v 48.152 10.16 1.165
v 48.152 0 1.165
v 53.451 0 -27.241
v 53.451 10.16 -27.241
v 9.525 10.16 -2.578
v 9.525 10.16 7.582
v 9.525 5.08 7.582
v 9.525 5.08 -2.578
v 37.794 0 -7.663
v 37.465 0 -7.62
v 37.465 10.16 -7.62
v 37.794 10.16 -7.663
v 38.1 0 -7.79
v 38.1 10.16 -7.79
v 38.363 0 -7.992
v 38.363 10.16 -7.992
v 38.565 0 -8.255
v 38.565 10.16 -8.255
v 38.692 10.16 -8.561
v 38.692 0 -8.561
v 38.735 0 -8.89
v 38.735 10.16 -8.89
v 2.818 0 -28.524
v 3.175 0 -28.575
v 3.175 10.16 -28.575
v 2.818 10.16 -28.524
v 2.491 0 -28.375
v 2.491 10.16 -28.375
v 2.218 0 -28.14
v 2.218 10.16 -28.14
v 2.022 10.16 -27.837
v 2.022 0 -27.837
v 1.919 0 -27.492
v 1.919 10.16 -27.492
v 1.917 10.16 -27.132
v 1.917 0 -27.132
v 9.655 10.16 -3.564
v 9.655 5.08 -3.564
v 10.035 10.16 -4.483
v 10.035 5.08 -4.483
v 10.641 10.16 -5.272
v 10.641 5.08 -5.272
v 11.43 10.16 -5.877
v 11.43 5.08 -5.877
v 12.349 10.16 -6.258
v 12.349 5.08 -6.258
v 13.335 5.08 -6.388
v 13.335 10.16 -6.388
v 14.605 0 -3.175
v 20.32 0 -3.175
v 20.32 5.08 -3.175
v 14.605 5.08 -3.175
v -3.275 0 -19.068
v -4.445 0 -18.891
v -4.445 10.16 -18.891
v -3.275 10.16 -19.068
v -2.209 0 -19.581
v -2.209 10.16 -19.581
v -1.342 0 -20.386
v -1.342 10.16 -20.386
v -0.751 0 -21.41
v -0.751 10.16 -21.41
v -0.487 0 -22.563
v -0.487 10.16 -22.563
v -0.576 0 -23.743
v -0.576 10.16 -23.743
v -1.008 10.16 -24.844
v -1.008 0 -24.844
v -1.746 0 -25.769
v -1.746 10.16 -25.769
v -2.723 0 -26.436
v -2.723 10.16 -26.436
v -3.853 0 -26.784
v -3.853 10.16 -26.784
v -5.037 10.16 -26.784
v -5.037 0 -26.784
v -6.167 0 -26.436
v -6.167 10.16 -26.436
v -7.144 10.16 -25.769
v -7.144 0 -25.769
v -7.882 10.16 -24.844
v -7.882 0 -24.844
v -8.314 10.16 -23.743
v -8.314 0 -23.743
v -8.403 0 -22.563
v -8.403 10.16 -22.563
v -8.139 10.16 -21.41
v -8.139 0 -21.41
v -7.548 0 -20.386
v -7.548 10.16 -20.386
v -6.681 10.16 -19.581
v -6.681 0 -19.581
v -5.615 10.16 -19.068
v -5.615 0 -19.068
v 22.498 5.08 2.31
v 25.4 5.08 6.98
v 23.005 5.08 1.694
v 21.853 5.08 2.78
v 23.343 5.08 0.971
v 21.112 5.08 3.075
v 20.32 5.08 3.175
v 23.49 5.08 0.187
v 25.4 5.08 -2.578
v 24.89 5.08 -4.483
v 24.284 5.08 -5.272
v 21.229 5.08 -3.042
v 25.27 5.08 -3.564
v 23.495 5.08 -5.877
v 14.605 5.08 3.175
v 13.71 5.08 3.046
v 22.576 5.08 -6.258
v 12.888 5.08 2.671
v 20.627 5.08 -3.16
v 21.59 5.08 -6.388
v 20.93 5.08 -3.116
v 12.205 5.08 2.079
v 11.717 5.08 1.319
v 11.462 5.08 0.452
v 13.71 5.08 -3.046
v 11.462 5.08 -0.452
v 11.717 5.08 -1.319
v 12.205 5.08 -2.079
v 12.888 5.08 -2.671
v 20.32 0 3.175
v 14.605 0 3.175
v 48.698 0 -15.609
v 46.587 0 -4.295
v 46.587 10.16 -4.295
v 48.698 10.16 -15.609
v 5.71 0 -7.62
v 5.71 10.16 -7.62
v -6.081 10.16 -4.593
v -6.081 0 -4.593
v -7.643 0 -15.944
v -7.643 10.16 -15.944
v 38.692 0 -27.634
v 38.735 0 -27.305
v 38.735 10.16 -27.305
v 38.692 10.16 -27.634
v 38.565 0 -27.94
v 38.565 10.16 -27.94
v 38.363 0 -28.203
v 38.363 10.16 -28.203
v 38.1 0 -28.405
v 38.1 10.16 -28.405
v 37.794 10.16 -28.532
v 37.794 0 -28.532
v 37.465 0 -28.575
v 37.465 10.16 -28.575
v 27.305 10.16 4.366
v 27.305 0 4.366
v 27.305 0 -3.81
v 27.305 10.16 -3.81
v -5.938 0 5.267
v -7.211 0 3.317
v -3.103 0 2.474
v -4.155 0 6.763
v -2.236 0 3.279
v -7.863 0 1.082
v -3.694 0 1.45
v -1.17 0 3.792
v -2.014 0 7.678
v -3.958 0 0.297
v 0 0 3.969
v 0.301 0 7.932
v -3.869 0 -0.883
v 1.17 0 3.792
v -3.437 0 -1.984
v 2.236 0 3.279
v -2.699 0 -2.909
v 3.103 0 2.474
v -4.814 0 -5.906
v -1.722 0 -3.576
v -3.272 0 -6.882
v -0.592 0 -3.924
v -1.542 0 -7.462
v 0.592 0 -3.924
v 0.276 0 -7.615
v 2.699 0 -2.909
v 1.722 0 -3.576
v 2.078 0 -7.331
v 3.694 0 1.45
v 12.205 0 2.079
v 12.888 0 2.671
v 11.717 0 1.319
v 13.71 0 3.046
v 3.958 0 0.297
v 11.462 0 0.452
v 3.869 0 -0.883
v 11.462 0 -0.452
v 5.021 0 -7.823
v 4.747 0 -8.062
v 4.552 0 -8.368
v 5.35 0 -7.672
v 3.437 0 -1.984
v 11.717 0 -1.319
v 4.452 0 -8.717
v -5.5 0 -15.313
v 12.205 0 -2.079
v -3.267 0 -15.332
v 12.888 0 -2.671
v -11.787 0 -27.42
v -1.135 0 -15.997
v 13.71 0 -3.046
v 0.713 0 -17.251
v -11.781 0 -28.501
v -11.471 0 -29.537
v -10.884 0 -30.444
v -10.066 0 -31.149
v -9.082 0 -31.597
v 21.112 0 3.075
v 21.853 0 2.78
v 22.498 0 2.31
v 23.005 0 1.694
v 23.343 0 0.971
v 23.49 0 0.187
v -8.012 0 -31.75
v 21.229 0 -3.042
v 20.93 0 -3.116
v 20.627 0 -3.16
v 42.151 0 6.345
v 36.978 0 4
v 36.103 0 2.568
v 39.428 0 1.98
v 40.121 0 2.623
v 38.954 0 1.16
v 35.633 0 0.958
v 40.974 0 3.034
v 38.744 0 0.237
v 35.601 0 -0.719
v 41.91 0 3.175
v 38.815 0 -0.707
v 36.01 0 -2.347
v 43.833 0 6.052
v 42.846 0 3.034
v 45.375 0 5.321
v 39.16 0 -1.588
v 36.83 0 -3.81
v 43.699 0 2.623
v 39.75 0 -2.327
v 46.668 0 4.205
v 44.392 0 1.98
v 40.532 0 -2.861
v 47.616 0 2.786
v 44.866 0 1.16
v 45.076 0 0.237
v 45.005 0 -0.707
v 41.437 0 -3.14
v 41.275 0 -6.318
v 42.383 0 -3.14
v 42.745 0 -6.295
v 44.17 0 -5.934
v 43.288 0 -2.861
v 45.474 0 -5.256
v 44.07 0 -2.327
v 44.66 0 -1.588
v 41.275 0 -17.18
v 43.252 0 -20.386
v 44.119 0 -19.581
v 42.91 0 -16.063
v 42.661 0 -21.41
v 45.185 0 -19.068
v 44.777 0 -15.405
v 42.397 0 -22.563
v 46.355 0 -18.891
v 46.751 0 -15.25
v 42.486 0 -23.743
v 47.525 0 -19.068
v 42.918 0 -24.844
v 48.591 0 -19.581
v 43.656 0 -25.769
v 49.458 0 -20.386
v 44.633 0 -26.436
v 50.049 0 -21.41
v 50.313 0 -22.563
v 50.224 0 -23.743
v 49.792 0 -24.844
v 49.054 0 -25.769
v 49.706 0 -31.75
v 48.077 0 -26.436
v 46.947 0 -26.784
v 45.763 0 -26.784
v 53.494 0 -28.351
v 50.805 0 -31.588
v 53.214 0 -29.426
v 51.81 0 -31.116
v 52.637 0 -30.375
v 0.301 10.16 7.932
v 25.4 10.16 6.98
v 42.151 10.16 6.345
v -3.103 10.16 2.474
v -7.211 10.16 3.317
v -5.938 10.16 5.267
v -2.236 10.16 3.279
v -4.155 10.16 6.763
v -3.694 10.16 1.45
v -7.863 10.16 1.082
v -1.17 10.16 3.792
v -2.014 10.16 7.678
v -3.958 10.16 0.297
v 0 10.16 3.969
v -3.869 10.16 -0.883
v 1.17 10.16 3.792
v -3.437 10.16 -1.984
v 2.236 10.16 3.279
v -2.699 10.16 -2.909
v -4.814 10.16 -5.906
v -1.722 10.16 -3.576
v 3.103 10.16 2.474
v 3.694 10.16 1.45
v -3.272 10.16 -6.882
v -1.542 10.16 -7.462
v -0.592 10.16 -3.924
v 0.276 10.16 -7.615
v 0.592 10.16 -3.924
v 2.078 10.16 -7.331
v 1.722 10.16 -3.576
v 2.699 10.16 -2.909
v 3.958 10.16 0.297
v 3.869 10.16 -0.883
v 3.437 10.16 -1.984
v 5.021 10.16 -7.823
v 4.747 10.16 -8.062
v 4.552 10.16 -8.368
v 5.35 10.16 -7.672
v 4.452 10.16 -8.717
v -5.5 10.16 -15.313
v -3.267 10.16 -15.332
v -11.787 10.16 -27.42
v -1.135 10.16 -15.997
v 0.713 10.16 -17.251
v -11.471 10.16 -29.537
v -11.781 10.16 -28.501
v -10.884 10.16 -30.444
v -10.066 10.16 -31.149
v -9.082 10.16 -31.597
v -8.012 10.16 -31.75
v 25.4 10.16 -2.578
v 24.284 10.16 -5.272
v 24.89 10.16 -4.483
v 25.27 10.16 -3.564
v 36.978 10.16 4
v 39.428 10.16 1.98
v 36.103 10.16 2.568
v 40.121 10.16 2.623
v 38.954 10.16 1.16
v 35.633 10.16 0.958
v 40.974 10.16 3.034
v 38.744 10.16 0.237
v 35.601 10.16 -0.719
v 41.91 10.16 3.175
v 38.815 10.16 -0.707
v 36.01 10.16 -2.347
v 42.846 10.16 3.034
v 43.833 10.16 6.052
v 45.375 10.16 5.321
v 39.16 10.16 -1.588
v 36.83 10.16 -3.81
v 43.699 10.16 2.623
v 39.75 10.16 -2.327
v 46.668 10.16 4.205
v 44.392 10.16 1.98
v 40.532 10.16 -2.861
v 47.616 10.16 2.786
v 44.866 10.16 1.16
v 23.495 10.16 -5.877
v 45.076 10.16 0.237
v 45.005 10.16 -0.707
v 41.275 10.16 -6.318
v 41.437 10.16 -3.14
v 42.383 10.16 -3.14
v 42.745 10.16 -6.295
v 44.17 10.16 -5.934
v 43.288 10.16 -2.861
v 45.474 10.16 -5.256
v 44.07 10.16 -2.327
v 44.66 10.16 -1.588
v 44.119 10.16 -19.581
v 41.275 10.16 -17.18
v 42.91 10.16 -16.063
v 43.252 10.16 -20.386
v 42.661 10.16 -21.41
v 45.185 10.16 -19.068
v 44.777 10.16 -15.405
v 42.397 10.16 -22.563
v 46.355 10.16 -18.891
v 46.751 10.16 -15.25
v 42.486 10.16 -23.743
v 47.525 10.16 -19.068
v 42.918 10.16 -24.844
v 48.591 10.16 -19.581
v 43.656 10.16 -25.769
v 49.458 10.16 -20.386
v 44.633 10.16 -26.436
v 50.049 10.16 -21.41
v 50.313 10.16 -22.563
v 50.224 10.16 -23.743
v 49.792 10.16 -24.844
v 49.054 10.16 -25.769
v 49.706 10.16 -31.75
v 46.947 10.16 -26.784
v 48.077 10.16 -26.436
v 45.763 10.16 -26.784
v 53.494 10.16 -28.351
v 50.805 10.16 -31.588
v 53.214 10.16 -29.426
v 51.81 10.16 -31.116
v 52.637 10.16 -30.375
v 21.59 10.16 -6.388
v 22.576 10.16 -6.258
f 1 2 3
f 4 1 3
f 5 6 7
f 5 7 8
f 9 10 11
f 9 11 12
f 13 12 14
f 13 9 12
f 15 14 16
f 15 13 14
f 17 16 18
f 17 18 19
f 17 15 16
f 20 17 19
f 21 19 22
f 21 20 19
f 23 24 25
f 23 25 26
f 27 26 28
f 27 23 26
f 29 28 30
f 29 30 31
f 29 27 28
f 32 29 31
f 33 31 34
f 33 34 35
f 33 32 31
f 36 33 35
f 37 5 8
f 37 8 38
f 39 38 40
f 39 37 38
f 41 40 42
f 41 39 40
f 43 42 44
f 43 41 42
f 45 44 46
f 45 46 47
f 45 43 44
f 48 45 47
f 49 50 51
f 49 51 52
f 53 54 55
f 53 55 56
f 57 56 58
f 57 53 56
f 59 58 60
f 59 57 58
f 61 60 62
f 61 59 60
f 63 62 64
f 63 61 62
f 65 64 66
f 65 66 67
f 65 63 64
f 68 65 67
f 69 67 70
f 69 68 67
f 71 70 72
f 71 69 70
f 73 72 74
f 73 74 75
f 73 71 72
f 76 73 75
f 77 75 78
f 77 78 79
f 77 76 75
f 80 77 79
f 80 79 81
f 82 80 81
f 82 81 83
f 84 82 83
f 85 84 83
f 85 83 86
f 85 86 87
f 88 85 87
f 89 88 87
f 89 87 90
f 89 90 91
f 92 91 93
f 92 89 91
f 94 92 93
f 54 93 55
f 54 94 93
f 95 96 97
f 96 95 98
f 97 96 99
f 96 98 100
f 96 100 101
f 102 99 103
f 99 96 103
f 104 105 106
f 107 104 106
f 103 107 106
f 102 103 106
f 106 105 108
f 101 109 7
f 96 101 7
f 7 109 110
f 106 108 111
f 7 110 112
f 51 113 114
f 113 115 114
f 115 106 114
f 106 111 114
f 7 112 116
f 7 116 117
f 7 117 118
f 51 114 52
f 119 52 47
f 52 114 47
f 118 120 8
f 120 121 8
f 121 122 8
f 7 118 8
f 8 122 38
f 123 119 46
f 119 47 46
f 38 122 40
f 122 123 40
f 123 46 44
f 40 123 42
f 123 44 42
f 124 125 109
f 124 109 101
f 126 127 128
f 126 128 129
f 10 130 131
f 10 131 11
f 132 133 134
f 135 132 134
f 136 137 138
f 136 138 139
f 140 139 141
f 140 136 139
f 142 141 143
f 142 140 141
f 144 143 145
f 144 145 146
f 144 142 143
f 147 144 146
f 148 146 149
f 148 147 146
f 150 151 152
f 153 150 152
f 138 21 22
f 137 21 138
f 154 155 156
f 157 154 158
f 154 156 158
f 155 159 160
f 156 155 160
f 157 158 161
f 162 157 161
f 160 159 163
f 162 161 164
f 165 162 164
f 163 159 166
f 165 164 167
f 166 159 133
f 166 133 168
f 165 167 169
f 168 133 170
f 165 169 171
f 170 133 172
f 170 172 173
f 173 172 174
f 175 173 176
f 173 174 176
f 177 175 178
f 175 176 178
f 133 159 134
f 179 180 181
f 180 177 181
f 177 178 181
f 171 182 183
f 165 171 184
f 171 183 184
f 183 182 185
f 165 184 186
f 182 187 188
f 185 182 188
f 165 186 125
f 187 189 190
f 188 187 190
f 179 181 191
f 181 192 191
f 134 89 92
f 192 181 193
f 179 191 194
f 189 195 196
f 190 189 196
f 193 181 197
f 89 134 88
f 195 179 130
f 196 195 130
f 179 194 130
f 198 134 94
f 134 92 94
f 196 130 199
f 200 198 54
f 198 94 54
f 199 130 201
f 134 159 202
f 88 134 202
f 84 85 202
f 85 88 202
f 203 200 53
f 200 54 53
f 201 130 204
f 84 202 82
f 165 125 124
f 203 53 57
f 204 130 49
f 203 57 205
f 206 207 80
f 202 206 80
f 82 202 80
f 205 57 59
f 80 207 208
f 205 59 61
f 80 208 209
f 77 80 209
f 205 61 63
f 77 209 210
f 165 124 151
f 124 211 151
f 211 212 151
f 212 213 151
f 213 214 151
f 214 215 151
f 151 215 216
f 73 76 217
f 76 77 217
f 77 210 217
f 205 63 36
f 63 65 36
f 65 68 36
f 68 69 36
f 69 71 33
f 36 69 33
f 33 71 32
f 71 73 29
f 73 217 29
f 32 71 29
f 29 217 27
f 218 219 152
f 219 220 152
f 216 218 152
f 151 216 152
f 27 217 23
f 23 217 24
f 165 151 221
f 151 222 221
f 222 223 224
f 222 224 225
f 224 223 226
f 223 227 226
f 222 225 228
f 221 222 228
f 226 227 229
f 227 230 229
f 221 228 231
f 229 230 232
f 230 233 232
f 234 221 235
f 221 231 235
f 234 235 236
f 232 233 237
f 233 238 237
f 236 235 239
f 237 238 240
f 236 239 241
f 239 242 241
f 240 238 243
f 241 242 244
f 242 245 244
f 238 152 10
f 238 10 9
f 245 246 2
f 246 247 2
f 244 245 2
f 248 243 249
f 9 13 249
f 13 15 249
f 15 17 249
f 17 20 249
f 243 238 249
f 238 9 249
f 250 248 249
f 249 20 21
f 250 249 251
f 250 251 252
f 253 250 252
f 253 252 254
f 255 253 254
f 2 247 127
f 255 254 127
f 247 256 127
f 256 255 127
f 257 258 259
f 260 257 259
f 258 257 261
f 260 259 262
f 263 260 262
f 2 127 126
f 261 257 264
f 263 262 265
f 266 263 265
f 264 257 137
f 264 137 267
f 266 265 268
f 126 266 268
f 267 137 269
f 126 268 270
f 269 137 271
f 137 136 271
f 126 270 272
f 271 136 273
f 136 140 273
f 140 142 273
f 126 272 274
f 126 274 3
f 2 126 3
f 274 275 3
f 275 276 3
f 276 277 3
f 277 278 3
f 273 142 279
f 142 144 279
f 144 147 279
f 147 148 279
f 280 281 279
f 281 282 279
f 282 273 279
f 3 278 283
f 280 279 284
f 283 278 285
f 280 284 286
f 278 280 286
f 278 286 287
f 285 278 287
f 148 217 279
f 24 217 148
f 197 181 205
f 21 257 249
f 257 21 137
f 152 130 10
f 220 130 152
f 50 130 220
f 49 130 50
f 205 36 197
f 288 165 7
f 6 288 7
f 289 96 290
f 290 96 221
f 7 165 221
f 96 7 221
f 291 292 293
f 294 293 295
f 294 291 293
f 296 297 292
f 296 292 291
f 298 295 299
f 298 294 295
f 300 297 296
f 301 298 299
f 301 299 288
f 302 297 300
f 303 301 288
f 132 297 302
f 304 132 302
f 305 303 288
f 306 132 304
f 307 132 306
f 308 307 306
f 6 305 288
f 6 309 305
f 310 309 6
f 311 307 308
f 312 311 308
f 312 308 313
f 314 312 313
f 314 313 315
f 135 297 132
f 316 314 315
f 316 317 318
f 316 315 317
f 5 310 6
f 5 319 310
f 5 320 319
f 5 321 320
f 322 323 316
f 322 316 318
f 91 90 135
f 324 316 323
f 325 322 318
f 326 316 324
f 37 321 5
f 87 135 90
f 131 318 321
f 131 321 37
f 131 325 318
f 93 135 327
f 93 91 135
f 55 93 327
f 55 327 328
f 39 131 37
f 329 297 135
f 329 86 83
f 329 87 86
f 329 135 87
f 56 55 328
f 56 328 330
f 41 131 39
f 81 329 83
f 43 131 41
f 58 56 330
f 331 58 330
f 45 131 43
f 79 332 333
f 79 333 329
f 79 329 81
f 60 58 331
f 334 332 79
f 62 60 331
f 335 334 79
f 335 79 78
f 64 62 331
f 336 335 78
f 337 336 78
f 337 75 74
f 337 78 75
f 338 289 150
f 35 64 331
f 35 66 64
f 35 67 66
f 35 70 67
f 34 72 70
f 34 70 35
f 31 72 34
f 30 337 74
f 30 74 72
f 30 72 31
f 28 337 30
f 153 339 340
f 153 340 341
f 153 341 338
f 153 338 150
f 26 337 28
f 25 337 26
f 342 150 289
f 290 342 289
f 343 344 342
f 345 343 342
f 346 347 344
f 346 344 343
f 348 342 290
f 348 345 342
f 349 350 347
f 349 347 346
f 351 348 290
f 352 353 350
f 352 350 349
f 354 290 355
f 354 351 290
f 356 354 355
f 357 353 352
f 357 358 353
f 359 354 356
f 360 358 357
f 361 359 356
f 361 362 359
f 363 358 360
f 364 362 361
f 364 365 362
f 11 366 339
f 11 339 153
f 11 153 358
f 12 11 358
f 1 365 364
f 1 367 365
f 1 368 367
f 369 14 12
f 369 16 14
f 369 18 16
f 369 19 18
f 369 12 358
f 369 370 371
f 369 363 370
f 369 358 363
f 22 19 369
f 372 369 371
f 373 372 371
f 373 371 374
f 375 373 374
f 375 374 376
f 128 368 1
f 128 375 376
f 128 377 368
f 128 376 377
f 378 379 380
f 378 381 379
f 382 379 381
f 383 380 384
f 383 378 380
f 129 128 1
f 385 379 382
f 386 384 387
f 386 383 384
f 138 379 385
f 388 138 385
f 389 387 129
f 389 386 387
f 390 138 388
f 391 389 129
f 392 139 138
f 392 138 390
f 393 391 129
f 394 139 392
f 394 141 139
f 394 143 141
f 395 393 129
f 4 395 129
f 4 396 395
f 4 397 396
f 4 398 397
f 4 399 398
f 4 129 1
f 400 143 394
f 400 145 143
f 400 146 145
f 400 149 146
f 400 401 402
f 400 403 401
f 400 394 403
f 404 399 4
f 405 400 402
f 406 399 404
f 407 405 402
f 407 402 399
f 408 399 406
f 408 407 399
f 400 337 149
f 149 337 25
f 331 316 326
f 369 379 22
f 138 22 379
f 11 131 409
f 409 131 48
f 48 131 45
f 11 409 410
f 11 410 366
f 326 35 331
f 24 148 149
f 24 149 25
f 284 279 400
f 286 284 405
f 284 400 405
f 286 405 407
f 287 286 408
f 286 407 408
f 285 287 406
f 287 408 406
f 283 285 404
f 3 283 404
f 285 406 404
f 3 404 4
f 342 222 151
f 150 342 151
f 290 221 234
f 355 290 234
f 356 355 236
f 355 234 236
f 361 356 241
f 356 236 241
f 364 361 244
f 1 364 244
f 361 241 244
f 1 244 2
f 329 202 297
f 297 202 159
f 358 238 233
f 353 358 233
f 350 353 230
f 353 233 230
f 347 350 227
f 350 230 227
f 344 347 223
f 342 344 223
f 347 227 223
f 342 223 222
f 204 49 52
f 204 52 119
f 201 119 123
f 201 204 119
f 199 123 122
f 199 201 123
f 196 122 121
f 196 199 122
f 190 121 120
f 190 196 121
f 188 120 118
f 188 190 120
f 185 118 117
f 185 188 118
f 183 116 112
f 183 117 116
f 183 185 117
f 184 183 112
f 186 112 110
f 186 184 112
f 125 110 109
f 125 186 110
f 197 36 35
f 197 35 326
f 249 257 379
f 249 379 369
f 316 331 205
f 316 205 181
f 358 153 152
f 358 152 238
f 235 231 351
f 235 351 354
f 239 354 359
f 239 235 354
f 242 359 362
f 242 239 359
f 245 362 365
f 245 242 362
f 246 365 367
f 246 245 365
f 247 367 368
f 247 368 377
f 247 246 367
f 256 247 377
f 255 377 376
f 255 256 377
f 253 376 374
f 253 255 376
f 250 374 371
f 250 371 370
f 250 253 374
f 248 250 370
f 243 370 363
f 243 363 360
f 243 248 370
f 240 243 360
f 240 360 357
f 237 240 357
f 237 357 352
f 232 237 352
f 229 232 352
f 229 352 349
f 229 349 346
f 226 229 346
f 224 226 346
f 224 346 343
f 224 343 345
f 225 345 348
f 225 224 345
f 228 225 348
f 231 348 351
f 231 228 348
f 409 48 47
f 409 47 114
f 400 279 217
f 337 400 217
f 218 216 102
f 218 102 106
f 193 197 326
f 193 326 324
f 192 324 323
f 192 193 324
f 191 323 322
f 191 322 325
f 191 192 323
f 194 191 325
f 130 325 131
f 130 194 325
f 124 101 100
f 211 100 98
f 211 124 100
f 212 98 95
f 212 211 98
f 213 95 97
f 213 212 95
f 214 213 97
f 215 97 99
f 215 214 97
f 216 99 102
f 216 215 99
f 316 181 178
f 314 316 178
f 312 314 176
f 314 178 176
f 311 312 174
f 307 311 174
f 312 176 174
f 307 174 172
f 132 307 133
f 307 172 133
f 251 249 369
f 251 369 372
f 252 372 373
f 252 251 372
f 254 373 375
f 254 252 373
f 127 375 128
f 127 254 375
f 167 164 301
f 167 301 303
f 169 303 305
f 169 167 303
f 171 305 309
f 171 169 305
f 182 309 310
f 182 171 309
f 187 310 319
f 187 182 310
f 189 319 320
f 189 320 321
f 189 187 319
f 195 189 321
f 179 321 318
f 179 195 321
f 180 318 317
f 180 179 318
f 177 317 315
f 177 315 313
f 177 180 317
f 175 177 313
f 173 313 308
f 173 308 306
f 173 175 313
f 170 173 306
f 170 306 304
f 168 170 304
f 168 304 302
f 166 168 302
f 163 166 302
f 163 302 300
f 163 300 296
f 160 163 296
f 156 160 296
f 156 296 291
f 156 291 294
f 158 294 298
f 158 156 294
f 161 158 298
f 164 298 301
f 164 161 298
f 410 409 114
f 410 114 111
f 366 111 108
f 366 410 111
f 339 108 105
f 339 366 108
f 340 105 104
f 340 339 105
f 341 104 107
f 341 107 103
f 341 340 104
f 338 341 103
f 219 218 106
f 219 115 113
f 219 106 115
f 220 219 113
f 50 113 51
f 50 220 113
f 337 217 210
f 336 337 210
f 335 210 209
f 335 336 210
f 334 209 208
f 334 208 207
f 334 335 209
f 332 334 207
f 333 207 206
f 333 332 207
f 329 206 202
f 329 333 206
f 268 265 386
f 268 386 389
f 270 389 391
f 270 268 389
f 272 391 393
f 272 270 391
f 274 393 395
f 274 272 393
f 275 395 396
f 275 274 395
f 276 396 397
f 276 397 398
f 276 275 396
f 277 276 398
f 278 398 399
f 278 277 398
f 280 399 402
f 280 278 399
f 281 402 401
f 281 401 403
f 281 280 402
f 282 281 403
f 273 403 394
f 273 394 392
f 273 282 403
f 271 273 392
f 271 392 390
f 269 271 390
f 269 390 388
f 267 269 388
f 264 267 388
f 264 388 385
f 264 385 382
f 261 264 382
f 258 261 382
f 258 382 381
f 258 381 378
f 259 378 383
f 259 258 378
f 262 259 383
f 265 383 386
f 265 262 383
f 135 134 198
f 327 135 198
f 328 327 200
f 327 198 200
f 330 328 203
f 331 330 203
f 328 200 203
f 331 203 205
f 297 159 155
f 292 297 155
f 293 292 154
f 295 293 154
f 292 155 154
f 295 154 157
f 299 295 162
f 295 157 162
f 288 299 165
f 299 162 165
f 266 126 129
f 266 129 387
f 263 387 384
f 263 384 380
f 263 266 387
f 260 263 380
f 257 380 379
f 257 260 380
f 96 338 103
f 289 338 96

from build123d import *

# Parameters (mm, degrees)
SKETCH3_R           = 3.96875
SKETCH3_R_2         = 3.175
BOSS_EXTRUDE4_DEPTH = 10.16
CUT_EXTRUDE3_DEPTH  = 5.08
FILLET1_R           = 3.81


with BuildPart() as part:
    # Sketch3 → Boss-Extrude4 (new body)
    with BuildSketch(Plane(origin=(0, 0, 0), x_dir=(1, 0, 0), z_dir=(0, 1, 0))):
        with BuildLine():
            Line((54.2925, 31.75), (-12.3825, 31.75))
            Line((-12.3825, 31.75), (-7.863361559, -1.082336008))
            ThreePointArc((-7.863361559, -1.082336008), (-5.101706023, -6.080830692), (0.300662879, -7.931803583))
            Line((0.300662879, -7.931803583), (42.150530303, -6.345442867))
            ThreePointArc((42.150530303, -6.345442867), (46.059378881, -4.806782177), (48.152310263, -1.164501002))
            Line((48.152310263, -1.164501002), (54.2925, 31.75))
        make_face()
        Circle(SKETCH3_R, mode=Mode.SUBTRACT)
        with Locations((-4.445, 22.86)):
            Circle(SKETCH3_R, mode=Mode.SUBTRACT)
        with Locations((46.355, 22.86)):
            Circle(SKETCH3_R, mode=Mode.SUBTRACT)
        with Locations((41.91, 0)):
            Circle(SKETCH3_R_2, mode=Mode.SUBTRACT)
        with BuildLine():
            Line((38.735, 8.89), (38.735, 27.305))
            ThreePointArc((38.735, 27.305), (38.363025612, 28.203025612), (37.465, 28.575))
            Line((37.465, 28.575), (3.175, 28.575))
            ThreePointArc((3.175, 28.575), (2.217704153, 28.139556566), (1.91686215, 27.131826239))
            Line((1.91686215, 27.131826239), (4.451556434, 8.716826239))
            ThreePointArc((4.451556434, 8.716826239), (4.875137717, 7.932704153), (5.709694283, 7.62))
            Line((5.709694283, 7.62), (37.465, 7.62))
            ThreePointArc((37.465, 7.62), (38.363025612, 7.991974388), (38.735, 8.89))
        make_face(mode=Mode.SUBTRACT)
        with BuildLine():
            Line((20.32, 3.175), (14.605, 3.175))
            ThreePointArc((14.605, 3.175), (11.43, 0), (14.605, -3.175))
            Line((14.605, -3.175), (20.32, -3.175))
            ThreePointArc((20.32, -3.175), (22.498043553, -2.310140965), (23.489504023, -0.186733089))
            Line((23.489504023, -0.186733089), (21.228562514, 3.04222602))
            ThreePointArc((21.228562514, 3.04222602), (20.779106407, 3.141631154), (20.32, 3.175))
        make_face(mode=Mode.SUBTRACT)
        with BuildLine():
            Line((46.58698696, 4.295147609), (48.697586564, 15.60902157))
            ThreePointArc((48.697586564, 15.60902157), (44.776818872, 15.405220035), (41.275, 17.180387337))
            Line((41.275, 17.180387337), (41.275, 6.318170226))
            ThreePointArc((41.275, 6.318170226), (44.169993312, 5.934216901), (46.58698696, 4.295147609))
        make_face(mode=Mode.SUBTRACT)
        with BuildLine():
            Line((-6.080523252, 4.592563226), (-7.642900683, 15.943510195))
            ThreePointArc((-7.642900683, 15.943510195), (-3.266927549, 15.331617352), (0.712930912, 17.251065278))
            Line((0.712930912, 17.251065278), (2.078345222, 7.331090037))
            ThreePointArc((2.078345222, 7.331090037), (-2.424714317, 7.223929712), (-6.080523252, 4.592563226))
        make_face(mode=Mode.SUBTRACT)
        with BuildLine():
            Line((36.977963889, -3.999689962), (27.305, -4.366353249))
            Line((27.305, -4.366353249), (27.305, 3.81))
            Line((27.305, 3.81), (36.83, 3.81))
            ThreePointArc((36.83, 3.81), (35.561139386, -0.120286735), (36.977963889, -3.999689962))
        make_face(mode=Mode.SUBTRACT)
    extrude(amount=BOSS_EXTRUDE4_DEPTH)

    # Sketch5 → Cut-Extrude3 (cut)
    with BuildSketch(Plane(origin=(0, 10.16, 0), x_dir=(1, 0, 0), z_dir=(0, 1, 0))):
        with BuildLine():
            Line((25.4, 2.577854061), (25.4, -7.582145939))
            Line((25.4, -7.582145939), (9.525, -7.582145939))
            Line((9.525, -7.582145939), (9.525, 2.577854061))
            ThreePointArc((9.525, 2.577854061), (10.640923164, 5.271930897), (13.335, 6.387854061))
            Line((13.335, 6.387854061), (21.59, 6.387854061))
            ThreePointArc((21.59, 6.387854061), (24.284076836, 5.271930897), (25.4, 2.577854061))
        make_face()
    extrude(amount=-CUT_EXTRUDE3_DEPTH, mode=Mode.SUBTRACT)

    # Fillet1
    fillet1_edges = [part.edges().sort_by_distance(p)[0] for p in [
        (-12.3825, 5.08, -31.75),
        (54.2925, 5.08, -31.75),
    ]]
    fillet(fillet1_edges, radius=FILLET1_R)


solid = part.part
